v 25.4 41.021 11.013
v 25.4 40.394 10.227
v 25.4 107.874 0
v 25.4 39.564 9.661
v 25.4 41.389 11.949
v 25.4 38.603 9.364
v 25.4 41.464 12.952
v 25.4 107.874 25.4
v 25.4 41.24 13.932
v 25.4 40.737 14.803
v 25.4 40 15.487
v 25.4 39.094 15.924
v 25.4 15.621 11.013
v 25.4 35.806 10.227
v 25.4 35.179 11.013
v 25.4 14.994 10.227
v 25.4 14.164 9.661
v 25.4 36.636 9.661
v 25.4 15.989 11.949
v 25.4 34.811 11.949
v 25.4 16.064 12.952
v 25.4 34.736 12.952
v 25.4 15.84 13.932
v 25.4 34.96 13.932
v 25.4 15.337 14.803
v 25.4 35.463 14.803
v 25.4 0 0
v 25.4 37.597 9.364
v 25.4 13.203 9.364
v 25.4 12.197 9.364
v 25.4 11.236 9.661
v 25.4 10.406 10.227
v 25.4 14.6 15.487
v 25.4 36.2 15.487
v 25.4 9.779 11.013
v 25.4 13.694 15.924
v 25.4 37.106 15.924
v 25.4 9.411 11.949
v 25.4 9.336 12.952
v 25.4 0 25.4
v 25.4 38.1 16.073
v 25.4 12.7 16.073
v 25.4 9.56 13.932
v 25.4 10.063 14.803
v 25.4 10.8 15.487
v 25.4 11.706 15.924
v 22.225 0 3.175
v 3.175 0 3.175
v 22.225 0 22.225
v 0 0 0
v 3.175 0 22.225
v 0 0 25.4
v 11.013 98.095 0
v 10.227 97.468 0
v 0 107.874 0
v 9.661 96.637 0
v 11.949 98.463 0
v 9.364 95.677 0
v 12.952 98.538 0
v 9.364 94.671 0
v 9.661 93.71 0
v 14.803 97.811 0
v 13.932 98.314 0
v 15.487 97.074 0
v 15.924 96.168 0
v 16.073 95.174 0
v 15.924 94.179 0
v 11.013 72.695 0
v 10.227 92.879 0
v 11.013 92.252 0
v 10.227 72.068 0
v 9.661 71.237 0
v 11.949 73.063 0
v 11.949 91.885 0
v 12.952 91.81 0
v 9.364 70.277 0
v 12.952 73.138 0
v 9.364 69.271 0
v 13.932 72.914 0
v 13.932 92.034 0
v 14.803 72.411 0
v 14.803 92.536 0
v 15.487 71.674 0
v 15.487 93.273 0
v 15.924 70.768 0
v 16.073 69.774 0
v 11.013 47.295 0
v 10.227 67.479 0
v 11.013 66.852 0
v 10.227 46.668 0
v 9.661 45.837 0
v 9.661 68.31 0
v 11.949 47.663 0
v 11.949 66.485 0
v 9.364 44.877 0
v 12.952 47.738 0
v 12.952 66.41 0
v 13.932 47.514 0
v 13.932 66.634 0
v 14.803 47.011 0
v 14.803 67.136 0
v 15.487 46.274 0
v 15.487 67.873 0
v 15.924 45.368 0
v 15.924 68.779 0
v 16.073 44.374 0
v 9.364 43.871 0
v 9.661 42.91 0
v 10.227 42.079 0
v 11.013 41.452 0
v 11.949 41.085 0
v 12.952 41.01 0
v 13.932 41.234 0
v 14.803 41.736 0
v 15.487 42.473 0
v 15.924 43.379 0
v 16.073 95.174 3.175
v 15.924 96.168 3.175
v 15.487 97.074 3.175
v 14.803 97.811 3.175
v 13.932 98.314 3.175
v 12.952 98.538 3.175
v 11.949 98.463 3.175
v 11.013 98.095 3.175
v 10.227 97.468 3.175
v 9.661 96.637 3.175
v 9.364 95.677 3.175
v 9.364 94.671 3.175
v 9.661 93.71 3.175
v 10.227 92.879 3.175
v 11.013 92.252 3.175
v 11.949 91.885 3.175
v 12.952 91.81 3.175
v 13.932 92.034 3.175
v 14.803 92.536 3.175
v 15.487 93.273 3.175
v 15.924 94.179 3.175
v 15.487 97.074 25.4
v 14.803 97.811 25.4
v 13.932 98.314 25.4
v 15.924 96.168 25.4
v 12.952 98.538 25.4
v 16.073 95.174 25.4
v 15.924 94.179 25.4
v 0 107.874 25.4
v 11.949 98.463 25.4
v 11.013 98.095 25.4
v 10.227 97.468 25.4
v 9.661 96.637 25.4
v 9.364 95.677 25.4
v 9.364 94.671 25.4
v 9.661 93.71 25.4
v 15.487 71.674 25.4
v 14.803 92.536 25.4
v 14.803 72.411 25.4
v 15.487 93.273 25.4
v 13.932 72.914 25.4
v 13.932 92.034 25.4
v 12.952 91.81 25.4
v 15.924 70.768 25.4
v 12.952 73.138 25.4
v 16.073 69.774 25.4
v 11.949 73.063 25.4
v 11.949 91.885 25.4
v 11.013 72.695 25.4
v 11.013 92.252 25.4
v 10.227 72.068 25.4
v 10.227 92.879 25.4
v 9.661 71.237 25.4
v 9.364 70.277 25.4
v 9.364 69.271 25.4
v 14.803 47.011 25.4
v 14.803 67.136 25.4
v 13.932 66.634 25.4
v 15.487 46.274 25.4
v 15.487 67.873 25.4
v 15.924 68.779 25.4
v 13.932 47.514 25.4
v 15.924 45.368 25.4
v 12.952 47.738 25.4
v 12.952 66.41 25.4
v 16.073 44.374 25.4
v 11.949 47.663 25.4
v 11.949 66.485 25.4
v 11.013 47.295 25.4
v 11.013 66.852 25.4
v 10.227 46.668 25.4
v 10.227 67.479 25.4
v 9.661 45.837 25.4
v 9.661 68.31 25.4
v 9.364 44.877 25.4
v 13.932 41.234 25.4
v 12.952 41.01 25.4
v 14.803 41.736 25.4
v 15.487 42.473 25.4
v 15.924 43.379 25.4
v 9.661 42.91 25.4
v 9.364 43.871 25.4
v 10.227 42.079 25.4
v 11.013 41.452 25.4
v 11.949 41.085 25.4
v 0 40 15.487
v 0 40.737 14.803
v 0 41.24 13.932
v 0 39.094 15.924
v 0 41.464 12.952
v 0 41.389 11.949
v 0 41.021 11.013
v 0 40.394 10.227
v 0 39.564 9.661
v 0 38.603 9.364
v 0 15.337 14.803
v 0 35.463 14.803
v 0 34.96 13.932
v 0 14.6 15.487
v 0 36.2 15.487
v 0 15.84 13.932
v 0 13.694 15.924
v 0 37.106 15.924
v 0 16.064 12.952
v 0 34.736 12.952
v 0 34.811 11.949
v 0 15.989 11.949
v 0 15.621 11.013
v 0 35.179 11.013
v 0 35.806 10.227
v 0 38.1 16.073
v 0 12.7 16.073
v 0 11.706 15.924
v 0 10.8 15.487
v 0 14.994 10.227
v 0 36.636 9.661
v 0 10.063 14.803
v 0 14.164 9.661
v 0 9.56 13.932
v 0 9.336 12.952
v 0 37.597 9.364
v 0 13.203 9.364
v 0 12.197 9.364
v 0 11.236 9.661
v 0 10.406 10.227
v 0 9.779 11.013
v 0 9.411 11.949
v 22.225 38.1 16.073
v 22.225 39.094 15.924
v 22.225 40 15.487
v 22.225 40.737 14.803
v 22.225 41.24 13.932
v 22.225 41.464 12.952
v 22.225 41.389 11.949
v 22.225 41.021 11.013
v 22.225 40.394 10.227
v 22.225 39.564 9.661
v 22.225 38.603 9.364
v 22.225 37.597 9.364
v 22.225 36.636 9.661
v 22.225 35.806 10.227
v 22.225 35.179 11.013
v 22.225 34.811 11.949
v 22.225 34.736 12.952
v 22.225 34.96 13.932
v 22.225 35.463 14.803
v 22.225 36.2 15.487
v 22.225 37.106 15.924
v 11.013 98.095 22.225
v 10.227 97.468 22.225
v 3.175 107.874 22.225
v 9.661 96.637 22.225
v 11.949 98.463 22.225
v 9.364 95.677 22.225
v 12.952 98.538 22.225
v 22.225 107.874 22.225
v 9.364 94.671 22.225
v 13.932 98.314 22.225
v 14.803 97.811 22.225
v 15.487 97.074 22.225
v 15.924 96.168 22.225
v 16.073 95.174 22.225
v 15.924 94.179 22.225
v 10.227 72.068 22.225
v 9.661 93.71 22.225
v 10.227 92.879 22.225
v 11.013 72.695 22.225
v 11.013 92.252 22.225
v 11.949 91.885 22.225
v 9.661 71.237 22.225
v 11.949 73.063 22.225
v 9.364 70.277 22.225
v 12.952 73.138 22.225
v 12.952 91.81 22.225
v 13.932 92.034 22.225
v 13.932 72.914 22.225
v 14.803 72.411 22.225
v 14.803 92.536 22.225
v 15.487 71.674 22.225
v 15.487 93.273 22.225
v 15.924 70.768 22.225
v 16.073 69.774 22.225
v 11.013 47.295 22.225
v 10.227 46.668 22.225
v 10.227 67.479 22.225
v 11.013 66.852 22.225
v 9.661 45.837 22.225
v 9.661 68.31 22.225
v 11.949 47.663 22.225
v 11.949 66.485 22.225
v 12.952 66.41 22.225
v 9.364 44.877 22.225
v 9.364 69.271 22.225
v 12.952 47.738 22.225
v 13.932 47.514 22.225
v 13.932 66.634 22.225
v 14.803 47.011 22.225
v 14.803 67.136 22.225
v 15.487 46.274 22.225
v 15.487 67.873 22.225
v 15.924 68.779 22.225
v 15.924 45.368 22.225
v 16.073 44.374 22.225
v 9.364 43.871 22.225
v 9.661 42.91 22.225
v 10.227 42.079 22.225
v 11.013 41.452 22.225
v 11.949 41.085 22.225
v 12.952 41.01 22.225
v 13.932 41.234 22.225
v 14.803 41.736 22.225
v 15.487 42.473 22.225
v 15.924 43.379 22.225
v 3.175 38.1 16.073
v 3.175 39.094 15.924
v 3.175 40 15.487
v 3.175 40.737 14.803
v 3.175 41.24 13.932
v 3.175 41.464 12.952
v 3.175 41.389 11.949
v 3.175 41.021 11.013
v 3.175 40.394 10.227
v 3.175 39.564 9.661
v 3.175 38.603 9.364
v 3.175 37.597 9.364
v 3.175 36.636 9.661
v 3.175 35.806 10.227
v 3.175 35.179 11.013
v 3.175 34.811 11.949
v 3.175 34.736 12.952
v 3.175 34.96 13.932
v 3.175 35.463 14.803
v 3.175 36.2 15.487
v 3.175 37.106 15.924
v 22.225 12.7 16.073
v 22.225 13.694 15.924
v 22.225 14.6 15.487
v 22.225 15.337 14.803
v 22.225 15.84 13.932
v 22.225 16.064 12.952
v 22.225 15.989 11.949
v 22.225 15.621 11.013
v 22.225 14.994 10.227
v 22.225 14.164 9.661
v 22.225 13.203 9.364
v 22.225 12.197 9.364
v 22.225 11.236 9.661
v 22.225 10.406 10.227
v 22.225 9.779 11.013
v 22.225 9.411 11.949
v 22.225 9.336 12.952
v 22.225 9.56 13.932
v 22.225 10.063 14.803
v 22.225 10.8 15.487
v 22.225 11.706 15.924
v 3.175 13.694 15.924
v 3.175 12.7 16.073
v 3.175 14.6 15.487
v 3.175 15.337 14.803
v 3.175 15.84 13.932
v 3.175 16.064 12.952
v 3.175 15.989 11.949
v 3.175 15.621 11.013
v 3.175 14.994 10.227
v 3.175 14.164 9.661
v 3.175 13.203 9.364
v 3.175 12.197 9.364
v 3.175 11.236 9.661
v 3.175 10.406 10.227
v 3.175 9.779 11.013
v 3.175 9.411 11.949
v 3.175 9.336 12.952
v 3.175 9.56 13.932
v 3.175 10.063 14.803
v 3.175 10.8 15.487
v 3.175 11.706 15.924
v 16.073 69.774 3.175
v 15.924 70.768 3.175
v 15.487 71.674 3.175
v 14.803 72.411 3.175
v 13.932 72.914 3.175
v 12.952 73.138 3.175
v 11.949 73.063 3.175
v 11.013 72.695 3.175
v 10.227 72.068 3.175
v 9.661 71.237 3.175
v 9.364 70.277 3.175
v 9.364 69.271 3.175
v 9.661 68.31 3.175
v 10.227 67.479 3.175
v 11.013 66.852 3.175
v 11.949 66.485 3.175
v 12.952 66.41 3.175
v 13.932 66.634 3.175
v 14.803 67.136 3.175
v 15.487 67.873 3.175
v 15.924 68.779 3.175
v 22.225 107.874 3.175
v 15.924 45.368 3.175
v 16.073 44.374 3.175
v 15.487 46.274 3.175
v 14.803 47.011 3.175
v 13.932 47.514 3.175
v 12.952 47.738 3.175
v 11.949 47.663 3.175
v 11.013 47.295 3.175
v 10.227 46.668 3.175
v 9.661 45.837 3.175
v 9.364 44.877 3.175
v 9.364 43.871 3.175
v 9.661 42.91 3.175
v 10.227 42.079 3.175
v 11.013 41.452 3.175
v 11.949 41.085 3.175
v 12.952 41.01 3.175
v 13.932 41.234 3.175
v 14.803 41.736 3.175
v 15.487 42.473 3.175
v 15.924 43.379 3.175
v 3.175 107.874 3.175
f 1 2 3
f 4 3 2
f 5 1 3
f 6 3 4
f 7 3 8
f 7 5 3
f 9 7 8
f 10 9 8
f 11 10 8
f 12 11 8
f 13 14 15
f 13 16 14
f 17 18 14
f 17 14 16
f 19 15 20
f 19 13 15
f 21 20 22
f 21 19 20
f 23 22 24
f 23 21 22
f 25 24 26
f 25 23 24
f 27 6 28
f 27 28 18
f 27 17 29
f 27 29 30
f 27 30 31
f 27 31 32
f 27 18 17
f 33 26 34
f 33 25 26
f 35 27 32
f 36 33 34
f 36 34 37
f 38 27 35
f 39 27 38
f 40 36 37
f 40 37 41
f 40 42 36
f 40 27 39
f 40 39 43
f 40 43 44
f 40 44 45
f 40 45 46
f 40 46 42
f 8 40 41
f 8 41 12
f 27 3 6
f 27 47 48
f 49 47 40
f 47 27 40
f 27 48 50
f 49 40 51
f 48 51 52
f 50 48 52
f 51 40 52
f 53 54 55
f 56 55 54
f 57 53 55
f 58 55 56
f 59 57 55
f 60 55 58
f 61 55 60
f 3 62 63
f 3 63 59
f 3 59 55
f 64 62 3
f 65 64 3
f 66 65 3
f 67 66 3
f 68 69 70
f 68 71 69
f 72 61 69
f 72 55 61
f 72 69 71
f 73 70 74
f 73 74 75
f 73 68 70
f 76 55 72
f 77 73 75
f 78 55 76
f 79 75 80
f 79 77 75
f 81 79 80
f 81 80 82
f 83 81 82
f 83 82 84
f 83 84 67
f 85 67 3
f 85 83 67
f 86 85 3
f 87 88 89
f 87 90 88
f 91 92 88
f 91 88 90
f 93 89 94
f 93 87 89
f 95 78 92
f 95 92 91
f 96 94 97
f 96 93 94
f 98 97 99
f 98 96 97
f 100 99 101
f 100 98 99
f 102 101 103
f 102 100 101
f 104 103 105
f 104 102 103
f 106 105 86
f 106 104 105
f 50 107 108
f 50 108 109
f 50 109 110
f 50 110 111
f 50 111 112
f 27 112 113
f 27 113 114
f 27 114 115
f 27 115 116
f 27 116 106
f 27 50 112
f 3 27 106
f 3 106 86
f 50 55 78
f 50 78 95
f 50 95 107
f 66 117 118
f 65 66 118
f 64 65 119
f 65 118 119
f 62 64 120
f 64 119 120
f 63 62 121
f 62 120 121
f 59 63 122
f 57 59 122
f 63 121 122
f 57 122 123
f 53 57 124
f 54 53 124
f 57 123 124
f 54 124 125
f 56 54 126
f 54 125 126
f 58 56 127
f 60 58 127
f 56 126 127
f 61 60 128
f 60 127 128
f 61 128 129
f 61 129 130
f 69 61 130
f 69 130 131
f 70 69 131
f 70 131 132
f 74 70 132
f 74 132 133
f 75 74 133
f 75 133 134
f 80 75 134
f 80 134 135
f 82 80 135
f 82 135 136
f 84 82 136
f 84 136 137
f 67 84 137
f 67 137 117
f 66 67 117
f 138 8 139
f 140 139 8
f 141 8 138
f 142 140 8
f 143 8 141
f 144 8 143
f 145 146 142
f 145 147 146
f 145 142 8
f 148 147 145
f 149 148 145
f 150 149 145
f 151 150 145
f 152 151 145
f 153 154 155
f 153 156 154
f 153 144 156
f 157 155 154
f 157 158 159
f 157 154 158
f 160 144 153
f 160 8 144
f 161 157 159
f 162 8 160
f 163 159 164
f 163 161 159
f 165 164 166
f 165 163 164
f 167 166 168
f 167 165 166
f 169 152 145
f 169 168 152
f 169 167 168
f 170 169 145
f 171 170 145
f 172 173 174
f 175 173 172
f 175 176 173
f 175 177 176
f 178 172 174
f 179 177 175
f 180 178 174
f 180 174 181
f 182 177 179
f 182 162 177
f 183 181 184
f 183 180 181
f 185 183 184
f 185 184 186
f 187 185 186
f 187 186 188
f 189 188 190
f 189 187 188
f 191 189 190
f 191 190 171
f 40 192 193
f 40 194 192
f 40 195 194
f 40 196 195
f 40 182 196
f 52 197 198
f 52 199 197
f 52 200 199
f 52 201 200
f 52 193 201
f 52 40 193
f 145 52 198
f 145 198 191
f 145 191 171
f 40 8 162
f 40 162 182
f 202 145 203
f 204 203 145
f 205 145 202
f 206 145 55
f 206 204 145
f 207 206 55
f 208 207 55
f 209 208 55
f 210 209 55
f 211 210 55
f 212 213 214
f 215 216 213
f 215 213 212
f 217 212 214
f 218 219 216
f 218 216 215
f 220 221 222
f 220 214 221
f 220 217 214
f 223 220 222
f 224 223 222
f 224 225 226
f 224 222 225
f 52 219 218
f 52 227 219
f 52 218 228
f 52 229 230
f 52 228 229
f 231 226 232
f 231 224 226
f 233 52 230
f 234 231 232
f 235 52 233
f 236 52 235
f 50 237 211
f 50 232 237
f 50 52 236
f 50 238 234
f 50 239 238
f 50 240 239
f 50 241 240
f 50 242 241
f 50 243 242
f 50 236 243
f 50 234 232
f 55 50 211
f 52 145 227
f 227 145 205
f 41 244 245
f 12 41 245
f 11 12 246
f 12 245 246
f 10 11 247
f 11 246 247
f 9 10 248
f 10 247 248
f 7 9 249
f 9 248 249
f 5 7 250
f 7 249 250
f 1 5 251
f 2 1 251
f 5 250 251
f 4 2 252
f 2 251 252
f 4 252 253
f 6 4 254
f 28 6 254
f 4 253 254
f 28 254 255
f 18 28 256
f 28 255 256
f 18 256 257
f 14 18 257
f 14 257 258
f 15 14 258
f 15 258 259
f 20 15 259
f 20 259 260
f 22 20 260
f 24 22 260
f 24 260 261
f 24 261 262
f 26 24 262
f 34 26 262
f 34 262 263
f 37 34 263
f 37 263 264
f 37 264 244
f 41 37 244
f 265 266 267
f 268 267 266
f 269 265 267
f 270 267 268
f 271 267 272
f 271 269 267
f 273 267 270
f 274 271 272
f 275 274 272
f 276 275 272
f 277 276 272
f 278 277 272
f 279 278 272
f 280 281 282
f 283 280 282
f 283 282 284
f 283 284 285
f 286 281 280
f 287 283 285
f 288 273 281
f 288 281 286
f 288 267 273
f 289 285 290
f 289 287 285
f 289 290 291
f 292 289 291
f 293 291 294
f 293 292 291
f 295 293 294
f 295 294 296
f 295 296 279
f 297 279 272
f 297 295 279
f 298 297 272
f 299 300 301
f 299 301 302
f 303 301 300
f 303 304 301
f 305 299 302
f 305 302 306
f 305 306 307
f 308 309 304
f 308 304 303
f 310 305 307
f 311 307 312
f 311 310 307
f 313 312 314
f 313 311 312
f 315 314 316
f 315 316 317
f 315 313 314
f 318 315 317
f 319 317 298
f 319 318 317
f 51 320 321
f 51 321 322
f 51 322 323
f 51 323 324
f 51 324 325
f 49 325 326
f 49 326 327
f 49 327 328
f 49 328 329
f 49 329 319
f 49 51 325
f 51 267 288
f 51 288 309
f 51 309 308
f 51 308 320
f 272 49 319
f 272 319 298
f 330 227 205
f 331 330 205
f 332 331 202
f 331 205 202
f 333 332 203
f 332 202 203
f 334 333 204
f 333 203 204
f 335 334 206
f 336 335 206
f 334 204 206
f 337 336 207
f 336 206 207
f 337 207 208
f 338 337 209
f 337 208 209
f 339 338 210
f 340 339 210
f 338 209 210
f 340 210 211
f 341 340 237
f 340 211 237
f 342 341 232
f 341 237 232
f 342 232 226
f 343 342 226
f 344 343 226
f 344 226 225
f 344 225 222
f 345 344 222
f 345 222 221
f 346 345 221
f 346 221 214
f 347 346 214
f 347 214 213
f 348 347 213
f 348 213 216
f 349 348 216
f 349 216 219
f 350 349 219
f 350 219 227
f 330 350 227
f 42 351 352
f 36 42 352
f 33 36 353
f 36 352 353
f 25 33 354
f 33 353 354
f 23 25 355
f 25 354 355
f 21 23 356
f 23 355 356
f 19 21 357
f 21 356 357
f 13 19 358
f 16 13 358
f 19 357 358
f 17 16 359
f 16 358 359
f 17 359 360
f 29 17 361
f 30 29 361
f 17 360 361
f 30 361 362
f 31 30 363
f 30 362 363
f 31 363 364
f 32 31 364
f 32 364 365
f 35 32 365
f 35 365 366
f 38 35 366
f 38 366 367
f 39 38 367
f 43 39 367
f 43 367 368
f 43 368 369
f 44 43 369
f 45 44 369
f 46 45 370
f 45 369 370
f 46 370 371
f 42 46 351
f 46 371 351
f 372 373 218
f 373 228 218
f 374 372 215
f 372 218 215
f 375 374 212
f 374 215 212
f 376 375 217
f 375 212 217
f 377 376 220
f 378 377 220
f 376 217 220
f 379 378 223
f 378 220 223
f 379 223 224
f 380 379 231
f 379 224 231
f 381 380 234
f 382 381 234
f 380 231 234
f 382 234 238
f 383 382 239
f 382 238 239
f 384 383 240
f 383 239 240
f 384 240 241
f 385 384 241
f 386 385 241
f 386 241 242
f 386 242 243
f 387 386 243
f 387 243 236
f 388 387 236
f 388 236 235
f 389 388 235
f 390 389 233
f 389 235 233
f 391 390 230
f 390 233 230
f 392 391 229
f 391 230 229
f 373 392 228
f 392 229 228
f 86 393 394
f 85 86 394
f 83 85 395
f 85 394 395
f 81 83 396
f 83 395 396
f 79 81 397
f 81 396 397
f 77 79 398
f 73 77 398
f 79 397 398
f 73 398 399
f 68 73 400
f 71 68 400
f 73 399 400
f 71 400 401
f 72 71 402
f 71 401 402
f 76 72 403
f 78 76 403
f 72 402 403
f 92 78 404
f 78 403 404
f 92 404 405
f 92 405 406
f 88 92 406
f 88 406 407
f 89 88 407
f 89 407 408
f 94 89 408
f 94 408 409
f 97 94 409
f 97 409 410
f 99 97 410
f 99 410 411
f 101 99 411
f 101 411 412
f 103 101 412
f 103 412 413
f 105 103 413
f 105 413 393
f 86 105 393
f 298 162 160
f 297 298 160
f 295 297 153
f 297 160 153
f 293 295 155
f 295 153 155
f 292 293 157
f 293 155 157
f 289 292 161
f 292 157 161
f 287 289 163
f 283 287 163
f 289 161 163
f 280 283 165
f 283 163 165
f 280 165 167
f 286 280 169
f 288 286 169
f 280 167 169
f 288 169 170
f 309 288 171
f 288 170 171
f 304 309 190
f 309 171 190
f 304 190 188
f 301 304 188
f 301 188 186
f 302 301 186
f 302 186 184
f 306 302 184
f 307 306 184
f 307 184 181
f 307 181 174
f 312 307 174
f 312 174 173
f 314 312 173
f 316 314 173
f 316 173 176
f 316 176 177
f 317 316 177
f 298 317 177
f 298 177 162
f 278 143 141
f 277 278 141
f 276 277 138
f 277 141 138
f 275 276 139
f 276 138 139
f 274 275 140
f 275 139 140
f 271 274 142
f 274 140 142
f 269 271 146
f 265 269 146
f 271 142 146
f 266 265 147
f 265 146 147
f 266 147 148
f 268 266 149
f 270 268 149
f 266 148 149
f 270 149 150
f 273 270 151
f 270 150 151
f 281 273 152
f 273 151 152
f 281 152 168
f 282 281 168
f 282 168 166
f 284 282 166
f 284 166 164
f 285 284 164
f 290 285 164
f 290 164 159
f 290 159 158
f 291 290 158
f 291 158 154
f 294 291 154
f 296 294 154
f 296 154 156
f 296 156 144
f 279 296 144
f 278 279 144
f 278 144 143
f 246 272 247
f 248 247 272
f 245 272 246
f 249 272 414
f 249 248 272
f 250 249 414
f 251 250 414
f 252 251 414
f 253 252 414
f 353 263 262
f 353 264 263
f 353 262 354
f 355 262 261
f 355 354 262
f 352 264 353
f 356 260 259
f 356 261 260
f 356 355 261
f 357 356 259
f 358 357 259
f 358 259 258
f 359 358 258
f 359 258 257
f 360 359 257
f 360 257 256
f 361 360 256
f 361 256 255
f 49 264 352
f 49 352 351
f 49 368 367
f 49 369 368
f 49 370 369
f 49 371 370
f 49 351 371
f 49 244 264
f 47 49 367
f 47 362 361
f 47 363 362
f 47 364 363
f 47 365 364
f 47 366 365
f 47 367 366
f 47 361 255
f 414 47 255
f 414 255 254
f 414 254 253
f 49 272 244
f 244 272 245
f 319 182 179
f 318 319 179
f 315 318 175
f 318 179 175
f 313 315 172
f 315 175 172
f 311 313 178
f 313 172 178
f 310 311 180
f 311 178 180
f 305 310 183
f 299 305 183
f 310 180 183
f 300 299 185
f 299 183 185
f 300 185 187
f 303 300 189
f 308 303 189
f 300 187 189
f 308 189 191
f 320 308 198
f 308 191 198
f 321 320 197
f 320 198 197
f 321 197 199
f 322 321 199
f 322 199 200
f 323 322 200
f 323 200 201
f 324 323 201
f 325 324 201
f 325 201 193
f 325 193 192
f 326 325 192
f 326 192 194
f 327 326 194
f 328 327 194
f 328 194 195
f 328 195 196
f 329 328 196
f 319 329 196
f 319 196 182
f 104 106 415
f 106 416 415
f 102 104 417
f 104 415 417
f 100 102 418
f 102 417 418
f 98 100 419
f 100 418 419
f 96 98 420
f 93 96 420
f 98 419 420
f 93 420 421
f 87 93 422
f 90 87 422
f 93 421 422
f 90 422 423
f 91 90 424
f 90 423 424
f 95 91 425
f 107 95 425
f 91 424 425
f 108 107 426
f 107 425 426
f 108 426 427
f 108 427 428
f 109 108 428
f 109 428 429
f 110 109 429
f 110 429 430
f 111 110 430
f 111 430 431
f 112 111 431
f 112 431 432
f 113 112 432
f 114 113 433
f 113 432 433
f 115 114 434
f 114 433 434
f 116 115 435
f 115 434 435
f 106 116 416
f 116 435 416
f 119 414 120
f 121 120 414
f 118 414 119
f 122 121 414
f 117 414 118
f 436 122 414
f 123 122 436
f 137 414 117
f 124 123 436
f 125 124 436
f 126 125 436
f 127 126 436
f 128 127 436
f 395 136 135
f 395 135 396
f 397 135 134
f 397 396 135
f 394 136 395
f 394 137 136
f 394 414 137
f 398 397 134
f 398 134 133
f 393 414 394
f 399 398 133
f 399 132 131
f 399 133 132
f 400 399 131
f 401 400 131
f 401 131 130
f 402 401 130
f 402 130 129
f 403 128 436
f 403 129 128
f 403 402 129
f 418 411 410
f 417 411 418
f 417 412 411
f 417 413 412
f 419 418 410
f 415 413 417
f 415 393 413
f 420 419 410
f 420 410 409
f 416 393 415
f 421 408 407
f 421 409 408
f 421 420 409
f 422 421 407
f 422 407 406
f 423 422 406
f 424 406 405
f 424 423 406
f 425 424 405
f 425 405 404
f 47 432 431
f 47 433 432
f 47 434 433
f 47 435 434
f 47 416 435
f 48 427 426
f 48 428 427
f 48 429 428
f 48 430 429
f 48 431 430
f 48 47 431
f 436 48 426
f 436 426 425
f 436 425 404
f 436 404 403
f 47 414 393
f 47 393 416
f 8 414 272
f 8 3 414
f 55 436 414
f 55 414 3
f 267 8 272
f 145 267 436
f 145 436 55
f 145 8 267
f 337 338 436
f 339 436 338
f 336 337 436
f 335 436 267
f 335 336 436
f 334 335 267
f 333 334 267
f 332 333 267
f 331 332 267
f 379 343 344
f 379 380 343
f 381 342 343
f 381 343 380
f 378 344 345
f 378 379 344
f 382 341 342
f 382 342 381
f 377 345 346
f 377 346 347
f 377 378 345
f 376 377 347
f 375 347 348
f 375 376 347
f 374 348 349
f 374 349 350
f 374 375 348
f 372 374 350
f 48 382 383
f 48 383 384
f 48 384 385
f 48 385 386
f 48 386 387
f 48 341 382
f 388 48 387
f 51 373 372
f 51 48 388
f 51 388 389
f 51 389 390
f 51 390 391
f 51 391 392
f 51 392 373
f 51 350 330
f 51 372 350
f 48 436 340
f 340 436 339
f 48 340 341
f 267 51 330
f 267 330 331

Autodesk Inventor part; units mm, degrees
ref_plane "YZ Plane" through (0, 0, 0) normal (1, 0, 0) x (0, 1, 0)
ref_plane "XZ Plane" through (0, 0, 0) normal (0, 1, 0) x (-1, 0, 0)
ref_plane "XY Plane" through (0, 0, 0) normal (0, 0, 1) x (1, 0, 0)
sketch "Sketch1" plane through (0, 0, 0) normal (0, 1, 0) x (-1, 0, 0)
  line L0 (0, 0) -> (-25.4, 0)
  line L1 (-25.4, 0) -> (-25.4, 25.4)
  line L2 (-25.4, 25.4) -> (0, 25.4)
  line L3 (0, 25.4) -> (0, 0)
  line L4 (-22.225, 22.225) -> (-22.225, 3.175)
  line L5 (-22.225, 3.175) -> (-3.175, 3.175)
  line L6 (-3.175, 3.175) -> (-3.175, 22.225)
  line L7 (-3.175, 22.225) -> (-22.225, 22.225)
  dimension "d0" = 25.4
  dimension "d1" = 25.4
  dimension "d2" = 3.175
extrude "Extrusion1" add sketch "Sketch1" along normal blind 107.8738
sketch "Sketch2" plane through (0, 0, 25.4) normal (0, 0, 1) x (1, 0, 0)
  circle A0 centre (12.7, 95.1738) radius 3.3734
  line L0 (25.4, 0) -> (25.4, 107.8738) projected
  line L1 (0, 107.8738) -> (25.4, 107.8738) projected
  circle A1 centre (12.7, 69.7738) radius 3.3734
  circle A2 centre (12.7, 44.3738) radius 3.3734
  point P0 (0, 0)
  dimension "d5" = 6.7469
  dimension "d6" = 12.7
  dimension "d7" = 12.7
  dimension "d8" = 6.7469
  dimension "d9" = 12.7
  dimension "d10" = 25.4
  dimension "d11" = 6.7469
  dimension "d12" = 25.4
  dimension "d13" = 12.7
extrude "Extrusion2" cut sketch "Sketch2" against normal blind 25.4
sketch "Sketch3" plane through (0, 0, 0) normal (-1, 0, 0) x (0, 0, 1)
  circle A0 centre (12.7, 12.7) radius 3.3734
  circle A1 centre (12.7, 38.1) radius 3.3734
  line L0 (25.4, 0) -> (25.4, 107.8738) projected
  line L1 (25.4, 0) -> (0, 0) projected
  dimension "d16" = 6.7469
  dimension "d17" = 12.7
  dimension "d18" = 12.7
  dimension "d19" = 12.7
  dimension "d20" = 38.1
extrude "Extrusion3" cut sketch "Sketch3" against normal blind 25.4
properties part number "upright beam"
